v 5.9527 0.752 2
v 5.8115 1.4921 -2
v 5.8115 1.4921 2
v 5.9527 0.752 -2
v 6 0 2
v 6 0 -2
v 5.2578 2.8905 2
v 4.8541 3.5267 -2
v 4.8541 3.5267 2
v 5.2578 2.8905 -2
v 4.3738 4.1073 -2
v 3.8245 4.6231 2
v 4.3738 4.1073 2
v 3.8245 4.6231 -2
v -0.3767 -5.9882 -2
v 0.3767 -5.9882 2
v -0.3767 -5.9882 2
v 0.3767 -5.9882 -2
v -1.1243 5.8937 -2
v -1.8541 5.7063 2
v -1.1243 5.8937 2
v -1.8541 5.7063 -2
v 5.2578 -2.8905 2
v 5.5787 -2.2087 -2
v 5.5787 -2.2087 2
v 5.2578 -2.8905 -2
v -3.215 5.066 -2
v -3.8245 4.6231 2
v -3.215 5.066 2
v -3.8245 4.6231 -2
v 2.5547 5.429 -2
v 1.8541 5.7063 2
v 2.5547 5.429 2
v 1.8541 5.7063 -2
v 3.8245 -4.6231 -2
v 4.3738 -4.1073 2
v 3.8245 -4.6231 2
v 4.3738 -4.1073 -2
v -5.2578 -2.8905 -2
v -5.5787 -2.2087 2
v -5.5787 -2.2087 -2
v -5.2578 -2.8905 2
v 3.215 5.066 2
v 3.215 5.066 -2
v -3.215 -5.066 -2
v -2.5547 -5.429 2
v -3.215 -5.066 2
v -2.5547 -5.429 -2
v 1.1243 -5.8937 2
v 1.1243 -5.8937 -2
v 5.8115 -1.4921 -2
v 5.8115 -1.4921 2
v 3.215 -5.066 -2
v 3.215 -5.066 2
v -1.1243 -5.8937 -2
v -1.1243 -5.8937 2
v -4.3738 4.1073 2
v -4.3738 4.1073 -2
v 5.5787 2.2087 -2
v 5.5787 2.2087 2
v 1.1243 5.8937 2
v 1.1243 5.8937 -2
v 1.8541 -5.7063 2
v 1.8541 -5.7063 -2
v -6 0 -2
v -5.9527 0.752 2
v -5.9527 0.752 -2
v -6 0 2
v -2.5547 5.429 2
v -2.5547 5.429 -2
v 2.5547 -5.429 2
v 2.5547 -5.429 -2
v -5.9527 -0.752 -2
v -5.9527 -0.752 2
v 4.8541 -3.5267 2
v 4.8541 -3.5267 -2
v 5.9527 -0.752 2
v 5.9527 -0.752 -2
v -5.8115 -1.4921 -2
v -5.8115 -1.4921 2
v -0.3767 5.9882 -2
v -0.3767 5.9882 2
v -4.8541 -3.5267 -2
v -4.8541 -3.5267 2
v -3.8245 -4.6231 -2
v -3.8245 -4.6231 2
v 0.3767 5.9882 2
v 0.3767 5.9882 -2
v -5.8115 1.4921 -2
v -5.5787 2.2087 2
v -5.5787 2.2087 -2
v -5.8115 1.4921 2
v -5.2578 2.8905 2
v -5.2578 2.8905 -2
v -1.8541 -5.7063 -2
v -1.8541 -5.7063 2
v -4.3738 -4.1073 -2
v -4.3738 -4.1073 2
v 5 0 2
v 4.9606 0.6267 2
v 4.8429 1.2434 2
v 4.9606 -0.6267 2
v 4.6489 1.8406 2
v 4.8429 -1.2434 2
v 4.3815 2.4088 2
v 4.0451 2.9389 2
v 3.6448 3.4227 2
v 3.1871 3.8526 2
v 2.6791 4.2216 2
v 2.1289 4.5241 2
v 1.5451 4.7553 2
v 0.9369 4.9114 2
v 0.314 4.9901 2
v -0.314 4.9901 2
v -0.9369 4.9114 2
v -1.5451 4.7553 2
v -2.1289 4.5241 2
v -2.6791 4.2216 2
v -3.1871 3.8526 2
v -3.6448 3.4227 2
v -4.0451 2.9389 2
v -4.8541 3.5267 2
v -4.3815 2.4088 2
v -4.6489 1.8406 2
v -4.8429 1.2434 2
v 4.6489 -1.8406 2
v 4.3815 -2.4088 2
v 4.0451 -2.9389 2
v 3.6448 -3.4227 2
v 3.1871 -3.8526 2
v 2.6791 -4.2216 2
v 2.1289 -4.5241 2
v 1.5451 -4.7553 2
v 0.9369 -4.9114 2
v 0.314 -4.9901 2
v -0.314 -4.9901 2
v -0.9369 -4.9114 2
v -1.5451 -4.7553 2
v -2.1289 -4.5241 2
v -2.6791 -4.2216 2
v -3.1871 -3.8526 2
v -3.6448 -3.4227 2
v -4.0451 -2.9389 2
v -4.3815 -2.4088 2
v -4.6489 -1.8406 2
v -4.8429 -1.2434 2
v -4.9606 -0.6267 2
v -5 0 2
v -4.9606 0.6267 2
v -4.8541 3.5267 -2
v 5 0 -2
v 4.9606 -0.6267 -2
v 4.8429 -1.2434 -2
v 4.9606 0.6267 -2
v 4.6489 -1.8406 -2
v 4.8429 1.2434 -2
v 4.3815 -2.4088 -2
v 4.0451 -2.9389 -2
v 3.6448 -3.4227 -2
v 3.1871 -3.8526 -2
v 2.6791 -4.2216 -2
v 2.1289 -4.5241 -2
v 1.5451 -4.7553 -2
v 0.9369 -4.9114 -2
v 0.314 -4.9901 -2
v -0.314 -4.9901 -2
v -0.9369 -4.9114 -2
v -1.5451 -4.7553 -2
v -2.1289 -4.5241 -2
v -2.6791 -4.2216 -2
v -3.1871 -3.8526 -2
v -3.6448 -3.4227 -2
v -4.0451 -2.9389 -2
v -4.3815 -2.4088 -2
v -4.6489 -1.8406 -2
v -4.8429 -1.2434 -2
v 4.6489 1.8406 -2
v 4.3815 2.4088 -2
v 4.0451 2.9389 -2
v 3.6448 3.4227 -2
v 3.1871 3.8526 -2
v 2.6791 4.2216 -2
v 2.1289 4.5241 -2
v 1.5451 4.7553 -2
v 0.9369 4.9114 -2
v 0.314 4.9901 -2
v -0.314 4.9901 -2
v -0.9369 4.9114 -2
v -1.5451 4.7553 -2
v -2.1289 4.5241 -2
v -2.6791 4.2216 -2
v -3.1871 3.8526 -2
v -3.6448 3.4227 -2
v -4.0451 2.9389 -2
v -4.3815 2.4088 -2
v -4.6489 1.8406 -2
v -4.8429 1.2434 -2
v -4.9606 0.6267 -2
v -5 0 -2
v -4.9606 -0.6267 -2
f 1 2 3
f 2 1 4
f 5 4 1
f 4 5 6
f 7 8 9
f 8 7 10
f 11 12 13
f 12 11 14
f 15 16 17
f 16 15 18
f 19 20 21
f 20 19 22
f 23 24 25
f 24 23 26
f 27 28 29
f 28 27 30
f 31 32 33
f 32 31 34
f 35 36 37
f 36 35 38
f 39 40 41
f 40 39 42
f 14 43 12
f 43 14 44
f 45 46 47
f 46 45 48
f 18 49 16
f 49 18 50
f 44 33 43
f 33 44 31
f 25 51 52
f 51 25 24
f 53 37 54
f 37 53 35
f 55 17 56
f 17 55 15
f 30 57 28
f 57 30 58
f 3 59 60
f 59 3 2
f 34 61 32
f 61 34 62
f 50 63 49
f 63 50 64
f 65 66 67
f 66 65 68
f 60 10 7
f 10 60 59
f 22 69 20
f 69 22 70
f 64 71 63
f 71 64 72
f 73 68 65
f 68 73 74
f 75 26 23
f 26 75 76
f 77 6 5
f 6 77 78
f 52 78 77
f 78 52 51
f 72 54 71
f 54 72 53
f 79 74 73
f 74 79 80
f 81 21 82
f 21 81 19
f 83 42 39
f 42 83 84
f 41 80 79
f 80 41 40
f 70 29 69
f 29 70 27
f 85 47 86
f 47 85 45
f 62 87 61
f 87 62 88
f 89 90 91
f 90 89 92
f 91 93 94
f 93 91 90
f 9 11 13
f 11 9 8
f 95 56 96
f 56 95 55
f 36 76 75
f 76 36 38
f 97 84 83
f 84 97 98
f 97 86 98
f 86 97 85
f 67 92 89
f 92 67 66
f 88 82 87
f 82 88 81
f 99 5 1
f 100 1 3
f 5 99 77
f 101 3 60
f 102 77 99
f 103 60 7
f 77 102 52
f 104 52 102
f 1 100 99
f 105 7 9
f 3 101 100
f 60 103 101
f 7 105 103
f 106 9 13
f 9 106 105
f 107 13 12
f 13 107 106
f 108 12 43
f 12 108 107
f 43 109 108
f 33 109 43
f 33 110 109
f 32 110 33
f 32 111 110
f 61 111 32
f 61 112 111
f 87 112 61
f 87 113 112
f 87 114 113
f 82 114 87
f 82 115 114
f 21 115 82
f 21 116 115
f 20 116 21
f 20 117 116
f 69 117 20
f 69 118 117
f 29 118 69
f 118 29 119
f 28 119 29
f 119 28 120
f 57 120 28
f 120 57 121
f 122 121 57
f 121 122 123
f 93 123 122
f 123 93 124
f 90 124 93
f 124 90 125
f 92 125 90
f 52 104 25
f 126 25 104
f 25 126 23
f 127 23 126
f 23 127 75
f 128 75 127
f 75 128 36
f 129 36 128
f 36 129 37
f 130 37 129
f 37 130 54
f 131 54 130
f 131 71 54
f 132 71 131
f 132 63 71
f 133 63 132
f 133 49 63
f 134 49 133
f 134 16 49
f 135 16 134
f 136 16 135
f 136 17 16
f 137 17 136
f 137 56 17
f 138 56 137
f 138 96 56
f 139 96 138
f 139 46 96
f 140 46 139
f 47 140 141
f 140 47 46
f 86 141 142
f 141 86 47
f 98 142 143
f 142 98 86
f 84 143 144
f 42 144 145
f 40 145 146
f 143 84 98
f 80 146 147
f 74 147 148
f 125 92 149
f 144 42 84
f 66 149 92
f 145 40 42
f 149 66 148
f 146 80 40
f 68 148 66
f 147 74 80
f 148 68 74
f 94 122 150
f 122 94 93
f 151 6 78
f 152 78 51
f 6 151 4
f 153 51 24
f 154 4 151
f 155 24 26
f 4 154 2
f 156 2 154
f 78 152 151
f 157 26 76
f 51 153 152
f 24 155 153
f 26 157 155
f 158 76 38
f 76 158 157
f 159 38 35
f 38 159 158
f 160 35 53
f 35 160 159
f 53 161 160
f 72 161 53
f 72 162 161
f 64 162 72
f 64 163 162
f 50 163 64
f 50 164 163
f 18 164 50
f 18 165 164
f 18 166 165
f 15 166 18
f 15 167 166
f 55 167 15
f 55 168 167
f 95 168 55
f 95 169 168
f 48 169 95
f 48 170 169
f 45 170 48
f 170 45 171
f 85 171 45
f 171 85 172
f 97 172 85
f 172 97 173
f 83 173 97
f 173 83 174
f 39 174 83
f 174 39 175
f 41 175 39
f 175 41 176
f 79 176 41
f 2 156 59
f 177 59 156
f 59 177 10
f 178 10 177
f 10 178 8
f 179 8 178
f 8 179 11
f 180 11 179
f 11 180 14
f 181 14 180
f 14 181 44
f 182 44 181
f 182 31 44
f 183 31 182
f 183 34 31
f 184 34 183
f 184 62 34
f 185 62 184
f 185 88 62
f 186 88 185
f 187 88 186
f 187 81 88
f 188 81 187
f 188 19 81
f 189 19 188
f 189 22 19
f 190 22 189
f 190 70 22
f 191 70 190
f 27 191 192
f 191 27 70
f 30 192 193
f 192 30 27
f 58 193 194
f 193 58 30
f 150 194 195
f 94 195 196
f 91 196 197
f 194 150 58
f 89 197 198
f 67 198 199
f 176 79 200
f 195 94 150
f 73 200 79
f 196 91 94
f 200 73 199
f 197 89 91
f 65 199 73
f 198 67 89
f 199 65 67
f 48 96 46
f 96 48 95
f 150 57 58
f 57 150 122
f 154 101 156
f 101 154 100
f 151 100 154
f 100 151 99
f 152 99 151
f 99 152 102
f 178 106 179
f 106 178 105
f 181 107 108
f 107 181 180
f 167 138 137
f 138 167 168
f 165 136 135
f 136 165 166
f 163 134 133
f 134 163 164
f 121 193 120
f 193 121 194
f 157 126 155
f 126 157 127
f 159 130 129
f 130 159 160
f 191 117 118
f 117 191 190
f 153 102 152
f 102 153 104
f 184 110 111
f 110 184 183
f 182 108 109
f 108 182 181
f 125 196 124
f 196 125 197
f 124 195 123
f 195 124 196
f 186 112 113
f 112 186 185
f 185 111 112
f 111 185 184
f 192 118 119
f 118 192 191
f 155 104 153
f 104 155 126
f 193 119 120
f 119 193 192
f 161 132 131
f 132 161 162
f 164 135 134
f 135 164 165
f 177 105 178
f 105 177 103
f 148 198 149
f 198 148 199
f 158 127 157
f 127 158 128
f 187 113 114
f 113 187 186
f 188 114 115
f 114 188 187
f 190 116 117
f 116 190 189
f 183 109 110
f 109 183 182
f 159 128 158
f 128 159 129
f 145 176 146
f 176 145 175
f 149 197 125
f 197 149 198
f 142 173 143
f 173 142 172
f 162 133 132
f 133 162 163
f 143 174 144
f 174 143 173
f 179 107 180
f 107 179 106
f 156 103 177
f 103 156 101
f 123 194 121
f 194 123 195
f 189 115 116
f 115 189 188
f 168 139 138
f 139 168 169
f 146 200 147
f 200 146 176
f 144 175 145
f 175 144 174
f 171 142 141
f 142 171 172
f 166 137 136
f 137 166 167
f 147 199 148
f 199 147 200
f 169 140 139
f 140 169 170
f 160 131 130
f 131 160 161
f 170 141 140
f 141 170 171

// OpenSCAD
$fn = 50;


difference() {
	union() {
		translate(v = [0, 0, -2.0000000000]) {
			cylinder(h = 4, r = 6.0000000000);
		}
	}
	union() {
		translate(v = [0, 0, -100.0000000000]) {
			cylinder(h = 200, r = 5.0000000000);
		}
	}
}
